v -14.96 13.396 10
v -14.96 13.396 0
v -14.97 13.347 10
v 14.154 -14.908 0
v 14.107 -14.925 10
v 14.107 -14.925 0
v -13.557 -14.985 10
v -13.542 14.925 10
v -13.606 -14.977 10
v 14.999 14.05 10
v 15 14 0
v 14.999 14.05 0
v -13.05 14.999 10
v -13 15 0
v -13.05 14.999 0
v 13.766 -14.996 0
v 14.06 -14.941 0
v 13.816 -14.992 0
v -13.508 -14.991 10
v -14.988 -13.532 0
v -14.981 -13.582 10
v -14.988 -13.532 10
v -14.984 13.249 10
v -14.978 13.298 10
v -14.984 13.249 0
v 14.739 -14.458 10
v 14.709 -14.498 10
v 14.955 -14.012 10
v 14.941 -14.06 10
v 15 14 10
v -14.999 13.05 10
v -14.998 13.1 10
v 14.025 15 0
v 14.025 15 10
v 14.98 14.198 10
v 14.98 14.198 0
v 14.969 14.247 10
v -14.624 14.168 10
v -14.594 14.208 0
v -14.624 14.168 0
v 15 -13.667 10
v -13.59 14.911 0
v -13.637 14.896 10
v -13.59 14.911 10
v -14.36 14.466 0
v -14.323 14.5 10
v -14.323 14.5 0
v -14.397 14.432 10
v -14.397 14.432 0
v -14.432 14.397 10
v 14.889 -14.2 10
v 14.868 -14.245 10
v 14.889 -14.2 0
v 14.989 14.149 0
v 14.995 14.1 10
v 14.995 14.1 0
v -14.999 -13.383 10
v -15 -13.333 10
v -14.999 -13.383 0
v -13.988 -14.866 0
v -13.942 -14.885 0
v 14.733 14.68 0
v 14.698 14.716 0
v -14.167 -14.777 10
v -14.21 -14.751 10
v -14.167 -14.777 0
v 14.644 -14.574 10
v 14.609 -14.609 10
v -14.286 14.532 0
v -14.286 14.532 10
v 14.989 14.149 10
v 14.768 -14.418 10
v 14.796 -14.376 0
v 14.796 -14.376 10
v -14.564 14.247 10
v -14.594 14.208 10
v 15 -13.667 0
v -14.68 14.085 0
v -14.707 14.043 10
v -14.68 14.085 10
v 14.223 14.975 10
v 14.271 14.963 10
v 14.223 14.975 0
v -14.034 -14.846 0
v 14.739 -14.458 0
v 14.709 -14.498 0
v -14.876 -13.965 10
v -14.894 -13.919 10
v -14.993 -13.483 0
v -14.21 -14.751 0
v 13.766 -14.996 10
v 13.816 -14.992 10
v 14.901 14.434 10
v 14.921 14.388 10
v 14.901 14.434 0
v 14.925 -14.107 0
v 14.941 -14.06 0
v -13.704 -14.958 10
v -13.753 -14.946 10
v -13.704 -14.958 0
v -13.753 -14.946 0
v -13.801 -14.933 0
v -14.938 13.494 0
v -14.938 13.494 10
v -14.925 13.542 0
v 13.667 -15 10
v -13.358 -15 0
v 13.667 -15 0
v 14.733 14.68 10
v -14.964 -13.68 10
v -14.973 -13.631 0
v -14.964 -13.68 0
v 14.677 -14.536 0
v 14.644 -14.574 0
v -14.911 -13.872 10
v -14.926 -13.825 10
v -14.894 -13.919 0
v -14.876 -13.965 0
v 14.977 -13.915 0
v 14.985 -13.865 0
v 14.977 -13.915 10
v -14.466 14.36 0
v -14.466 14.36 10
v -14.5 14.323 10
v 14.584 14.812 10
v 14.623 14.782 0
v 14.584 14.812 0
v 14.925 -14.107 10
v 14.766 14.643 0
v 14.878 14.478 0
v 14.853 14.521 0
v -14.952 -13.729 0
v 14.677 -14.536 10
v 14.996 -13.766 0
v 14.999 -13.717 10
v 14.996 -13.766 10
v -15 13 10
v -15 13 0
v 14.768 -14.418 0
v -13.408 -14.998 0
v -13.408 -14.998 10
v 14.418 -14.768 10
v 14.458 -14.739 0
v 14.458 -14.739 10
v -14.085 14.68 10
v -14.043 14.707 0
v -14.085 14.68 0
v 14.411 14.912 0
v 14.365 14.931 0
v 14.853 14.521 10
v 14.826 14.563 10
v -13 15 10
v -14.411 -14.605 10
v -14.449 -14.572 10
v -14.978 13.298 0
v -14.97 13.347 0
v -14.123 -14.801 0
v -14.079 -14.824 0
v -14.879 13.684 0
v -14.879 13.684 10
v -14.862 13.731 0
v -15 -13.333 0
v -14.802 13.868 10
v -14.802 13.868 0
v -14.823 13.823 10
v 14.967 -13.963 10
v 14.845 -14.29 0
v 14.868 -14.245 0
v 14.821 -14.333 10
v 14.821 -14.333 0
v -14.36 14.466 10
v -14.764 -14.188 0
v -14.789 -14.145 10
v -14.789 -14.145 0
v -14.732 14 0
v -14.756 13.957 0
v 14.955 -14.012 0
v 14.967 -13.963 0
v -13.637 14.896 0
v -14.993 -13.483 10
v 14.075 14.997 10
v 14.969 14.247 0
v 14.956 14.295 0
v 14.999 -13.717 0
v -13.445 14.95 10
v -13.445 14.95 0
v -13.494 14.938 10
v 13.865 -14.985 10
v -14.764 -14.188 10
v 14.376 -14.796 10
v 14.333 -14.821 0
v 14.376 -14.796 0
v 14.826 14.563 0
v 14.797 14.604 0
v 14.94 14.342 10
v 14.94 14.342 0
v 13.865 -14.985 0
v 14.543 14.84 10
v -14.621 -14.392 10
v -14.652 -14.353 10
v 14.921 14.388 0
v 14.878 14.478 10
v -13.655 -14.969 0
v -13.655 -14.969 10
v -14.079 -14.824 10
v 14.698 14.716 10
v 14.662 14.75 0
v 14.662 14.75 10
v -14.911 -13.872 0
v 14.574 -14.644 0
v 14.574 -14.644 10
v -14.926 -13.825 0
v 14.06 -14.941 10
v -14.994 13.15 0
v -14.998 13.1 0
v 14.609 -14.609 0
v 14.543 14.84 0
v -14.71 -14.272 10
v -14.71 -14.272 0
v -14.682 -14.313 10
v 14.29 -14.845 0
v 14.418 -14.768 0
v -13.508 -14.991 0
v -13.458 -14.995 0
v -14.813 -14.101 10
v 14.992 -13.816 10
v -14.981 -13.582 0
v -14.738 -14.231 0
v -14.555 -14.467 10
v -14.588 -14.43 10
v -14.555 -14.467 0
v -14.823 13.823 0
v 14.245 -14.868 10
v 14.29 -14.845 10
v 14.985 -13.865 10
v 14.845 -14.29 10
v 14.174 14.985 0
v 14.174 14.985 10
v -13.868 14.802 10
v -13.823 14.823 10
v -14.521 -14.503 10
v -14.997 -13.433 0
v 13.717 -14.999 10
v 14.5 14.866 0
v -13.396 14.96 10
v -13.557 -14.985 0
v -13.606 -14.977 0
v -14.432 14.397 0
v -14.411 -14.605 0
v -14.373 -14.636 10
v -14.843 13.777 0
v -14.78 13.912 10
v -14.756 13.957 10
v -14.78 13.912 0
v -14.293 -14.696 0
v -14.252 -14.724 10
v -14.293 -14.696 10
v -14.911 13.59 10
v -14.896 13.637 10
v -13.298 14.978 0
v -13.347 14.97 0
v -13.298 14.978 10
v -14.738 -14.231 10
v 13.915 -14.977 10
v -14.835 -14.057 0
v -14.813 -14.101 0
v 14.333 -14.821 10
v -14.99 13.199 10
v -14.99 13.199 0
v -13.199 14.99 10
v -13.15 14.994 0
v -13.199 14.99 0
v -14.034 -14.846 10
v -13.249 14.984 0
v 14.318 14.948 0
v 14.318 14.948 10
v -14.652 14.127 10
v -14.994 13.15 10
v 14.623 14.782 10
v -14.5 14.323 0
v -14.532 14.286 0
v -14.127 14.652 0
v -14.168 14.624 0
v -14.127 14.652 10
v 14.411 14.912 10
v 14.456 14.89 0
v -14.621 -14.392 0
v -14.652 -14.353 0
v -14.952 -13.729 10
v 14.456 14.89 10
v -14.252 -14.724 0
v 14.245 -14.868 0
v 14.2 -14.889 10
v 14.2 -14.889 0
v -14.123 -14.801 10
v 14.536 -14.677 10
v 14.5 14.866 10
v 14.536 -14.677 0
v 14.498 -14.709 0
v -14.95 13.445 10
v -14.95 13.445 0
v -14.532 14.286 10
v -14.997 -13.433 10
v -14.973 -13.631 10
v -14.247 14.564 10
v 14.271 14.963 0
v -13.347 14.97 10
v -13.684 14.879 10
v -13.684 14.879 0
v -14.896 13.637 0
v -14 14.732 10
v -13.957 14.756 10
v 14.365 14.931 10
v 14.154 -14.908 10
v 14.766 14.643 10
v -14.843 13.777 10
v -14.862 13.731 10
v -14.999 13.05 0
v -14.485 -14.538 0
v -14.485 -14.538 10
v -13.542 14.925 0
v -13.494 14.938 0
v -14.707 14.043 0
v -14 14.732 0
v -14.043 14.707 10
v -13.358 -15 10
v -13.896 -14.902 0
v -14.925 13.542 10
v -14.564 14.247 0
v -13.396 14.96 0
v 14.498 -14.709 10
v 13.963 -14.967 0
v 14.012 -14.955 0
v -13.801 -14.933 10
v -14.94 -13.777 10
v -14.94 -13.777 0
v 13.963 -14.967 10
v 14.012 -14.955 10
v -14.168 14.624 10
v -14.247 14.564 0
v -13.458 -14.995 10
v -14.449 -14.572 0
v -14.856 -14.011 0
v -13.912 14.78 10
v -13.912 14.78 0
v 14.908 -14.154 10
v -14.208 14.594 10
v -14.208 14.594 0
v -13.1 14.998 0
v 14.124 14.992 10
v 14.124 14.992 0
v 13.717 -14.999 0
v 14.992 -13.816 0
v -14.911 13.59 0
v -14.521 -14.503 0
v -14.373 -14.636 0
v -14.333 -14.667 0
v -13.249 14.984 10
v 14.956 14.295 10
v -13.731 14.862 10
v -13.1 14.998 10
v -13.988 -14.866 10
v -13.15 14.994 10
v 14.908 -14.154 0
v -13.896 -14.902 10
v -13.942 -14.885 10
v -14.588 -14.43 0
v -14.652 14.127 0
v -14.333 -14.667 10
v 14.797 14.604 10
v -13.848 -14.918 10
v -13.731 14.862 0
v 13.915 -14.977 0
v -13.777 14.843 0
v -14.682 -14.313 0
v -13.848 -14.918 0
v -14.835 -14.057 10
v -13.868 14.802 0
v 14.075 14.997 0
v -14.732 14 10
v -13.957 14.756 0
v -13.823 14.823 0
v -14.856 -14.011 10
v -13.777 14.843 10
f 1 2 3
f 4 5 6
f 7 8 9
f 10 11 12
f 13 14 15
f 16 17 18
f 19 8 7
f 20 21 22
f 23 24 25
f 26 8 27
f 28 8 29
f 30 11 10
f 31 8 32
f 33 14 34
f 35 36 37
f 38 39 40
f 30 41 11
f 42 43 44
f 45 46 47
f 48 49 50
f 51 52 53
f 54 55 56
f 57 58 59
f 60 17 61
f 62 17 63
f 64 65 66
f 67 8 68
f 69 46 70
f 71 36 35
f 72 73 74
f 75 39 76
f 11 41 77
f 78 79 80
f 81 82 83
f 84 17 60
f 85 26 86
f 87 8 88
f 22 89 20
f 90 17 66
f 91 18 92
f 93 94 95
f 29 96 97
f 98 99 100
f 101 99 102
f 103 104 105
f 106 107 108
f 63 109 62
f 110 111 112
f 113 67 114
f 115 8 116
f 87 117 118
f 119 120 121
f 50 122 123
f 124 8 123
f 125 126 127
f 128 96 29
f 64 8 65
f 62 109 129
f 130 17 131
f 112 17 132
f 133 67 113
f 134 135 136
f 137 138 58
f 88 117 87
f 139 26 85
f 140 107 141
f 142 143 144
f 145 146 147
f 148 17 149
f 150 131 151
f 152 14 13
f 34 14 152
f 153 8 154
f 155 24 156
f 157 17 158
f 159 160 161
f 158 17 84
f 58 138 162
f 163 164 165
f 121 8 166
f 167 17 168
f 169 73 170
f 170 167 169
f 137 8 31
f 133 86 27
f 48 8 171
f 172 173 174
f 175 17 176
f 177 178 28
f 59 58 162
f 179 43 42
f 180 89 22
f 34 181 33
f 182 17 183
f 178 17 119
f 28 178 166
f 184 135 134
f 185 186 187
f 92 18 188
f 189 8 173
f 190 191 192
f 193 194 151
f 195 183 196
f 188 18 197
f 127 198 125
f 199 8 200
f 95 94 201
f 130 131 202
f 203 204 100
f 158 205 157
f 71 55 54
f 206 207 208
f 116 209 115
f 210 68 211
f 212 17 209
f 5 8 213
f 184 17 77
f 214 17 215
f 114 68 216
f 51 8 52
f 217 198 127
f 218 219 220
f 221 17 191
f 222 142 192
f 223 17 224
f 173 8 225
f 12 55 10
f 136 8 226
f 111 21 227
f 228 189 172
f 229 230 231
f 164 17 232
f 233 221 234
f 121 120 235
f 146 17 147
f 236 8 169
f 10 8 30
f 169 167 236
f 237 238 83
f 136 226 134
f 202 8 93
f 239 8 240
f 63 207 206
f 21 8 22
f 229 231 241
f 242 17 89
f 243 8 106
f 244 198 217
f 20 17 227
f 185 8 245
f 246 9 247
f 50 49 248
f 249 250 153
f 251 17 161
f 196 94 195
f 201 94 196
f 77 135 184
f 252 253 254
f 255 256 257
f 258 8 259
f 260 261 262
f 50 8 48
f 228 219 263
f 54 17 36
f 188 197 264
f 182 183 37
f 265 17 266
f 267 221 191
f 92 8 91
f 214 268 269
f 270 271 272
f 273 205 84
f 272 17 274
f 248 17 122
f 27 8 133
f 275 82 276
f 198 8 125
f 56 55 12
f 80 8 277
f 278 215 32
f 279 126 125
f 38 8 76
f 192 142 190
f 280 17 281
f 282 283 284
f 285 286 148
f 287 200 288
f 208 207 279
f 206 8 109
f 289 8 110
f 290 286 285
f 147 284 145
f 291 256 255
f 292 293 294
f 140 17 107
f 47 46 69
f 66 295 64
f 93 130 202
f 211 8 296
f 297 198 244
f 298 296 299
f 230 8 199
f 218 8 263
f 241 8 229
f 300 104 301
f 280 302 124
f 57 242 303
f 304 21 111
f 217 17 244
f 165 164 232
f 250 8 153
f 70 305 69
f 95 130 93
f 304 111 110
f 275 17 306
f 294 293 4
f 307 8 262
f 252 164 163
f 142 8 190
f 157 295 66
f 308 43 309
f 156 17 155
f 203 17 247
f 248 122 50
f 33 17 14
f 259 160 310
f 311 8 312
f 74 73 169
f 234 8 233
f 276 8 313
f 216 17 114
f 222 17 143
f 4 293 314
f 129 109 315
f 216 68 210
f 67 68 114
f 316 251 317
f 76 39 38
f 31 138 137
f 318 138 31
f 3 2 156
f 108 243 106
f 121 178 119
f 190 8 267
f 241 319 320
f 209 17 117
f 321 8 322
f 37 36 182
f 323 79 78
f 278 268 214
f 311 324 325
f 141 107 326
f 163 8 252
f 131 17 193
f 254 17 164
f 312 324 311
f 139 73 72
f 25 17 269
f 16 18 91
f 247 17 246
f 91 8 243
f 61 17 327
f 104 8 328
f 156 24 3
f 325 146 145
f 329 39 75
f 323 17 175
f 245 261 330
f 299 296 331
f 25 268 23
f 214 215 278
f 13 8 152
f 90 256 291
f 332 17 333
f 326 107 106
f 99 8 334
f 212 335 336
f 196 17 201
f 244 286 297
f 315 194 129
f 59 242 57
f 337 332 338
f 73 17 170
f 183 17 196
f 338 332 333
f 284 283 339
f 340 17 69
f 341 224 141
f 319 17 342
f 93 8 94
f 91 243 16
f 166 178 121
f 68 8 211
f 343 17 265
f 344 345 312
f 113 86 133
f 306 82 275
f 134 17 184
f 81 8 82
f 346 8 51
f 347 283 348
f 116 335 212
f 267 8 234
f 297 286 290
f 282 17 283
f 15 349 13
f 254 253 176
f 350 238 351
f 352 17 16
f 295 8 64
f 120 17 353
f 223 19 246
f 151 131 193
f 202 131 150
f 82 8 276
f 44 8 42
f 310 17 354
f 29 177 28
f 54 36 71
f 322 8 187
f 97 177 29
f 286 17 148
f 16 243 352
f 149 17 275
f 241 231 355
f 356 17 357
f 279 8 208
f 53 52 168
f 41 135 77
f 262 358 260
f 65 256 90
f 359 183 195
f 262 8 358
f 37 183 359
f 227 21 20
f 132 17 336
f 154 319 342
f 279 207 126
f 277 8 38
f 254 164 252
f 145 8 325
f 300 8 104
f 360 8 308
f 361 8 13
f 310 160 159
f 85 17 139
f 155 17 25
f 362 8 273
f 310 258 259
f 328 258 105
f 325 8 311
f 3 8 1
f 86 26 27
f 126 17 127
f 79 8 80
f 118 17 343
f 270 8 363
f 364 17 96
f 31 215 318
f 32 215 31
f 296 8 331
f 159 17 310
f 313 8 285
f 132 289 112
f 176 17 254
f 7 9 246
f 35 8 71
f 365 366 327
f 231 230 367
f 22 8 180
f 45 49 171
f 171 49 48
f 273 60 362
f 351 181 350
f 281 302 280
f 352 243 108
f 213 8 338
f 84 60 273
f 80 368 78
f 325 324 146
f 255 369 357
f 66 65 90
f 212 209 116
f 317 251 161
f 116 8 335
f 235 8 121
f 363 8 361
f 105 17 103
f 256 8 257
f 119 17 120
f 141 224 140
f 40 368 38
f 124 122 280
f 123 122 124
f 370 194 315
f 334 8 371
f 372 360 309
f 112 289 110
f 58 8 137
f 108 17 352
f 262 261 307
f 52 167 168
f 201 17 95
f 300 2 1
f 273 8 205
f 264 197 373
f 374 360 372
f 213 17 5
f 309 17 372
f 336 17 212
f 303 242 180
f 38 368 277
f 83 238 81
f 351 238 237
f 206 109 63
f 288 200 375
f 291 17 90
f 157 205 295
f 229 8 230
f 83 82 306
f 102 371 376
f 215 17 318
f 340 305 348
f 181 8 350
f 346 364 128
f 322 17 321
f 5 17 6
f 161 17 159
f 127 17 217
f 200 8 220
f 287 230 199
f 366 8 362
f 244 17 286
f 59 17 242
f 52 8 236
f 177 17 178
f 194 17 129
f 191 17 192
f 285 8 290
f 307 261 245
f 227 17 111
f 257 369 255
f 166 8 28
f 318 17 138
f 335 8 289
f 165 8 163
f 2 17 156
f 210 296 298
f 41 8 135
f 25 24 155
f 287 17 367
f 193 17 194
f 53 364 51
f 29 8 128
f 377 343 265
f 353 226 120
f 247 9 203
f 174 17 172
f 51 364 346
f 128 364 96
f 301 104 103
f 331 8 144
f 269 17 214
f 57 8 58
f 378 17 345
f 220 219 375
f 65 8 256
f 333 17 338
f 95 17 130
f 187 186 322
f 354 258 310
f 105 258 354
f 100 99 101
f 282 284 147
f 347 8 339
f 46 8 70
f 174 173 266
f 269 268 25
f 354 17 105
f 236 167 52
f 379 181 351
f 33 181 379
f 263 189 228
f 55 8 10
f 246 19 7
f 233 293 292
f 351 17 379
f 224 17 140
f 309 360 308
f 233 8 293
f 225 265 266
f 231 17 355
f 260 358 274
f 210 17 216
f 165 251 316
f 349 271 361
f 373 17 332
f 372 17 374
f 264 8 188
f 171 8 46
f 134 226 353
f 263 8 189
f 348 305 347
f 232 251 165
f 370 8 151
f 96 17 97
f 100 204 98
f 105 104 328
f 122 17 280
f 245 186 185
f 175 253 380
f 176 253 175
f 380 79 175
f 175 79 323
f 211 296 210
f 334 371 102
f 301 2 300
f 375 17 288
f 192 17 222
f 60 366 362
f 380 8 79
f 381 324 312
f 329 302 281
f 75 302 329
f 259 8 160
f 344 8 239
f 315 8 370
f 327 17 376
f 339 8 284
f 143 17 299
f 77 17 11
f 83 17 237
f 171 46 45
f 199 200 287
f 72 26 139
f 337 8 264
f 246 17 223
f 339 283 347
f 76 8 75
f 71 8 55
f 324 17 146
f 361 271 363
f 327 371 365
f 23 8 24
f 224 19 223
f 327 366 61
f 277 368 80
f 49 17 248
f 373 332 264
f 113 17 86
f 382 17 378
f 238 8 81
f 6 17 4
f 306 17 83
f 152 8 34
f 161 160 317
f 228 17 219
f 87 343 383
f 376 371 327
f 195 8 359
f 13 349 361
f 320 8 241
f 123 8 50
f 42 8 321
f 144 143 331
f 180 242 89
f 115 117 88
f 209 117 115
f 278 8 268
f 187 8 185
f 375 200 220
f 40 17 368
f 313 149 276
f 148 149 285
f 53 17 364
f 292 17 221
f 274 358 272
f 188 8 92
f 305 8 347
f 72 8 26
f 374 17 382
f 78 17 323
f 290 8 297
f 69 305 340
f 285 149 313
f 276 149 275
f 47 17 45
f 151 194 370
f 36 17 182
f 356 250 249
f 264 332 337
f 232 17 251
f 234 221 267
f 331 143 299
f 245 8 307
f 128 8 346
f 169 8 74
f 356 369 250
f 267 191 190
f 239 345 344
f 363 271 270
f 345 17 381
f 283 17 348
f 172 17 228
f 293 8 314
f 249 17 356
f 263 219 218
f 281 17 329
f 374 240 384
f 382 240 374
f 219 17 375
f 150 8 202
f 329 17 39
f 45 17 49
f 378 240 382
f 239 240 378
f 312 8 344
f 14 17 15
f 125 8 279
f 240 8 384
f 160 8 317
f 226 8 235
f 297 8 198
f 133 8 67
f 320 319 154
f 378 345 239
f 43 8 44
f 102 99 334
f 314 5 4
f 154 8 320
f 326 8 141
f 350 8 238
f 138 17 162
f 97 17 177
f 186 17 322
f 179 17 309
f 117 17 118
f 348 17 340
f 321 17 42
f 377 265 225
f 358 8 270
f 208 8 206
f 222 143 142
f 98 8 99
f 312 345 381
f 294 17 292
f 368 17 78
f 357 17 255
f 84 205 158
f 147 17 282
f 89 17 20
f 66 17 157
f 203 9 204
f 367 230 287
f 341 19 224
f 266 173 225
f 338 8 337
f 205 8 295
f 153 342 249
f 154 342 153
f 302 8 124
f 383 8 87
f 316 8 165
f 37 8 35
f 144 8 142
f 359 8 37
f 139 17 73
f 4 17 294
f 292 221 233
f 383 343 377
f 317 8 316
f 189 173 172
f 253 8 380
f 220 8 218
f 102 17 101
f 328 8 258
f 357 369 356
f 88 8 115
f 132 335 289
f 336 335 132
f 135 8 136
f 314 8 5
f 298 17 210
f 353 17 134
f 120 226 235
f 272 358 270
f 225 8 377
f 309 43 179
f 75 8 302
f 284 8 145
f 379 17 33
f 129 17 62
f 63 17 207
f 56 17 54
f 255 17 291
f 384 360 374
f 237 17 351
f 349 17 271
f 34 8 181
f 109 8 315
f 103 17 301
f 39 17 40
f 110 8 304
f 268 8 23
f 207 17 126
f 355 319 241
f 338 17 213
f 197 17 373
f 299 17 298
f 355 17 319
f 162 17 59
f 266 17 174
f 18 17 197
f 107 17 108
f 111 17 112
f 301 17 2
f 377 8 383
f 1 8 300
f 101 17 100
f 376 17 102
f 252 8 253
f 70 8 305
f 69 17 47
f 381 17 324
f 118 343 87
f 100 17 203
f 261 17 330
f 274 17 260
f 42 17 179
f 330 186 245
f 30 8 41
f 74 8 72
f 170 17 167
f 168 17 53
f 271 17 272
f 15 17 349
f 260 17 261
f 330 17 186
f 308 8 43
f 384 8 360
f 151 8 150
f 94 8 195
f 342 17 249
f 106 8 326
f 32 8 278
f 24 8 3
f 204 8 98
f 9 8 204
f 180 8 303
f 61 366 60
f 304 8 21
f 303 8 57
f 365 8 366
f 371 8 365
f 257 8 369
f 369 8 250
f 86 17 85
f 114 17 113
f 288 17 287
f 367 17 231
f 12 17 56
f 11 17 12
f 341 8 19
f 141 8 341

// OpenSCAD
$fa = .01;
$fs = $preview ? .2 : .05;

r1 = 1.0;
r2 = 1.3333;
r3 = 1.6666;
r4 = 1.9999;
width = 30;
height = 10;
hull(){
    translate([ (width/2-r1), (width/2-r1),0]) cylinder(h=height, r=r1);
    translate([ (width/2-r2),-(width/2-r2),0]) cylinder(h=height, r=r2);
    translate([-(width/2-r3),-(width/2-r3),0]) cylinder(h=height, r=r3);
    translate([-(width/2-r4), (width/2-r4),0]) cylinder(h=height, r=r4);
}
